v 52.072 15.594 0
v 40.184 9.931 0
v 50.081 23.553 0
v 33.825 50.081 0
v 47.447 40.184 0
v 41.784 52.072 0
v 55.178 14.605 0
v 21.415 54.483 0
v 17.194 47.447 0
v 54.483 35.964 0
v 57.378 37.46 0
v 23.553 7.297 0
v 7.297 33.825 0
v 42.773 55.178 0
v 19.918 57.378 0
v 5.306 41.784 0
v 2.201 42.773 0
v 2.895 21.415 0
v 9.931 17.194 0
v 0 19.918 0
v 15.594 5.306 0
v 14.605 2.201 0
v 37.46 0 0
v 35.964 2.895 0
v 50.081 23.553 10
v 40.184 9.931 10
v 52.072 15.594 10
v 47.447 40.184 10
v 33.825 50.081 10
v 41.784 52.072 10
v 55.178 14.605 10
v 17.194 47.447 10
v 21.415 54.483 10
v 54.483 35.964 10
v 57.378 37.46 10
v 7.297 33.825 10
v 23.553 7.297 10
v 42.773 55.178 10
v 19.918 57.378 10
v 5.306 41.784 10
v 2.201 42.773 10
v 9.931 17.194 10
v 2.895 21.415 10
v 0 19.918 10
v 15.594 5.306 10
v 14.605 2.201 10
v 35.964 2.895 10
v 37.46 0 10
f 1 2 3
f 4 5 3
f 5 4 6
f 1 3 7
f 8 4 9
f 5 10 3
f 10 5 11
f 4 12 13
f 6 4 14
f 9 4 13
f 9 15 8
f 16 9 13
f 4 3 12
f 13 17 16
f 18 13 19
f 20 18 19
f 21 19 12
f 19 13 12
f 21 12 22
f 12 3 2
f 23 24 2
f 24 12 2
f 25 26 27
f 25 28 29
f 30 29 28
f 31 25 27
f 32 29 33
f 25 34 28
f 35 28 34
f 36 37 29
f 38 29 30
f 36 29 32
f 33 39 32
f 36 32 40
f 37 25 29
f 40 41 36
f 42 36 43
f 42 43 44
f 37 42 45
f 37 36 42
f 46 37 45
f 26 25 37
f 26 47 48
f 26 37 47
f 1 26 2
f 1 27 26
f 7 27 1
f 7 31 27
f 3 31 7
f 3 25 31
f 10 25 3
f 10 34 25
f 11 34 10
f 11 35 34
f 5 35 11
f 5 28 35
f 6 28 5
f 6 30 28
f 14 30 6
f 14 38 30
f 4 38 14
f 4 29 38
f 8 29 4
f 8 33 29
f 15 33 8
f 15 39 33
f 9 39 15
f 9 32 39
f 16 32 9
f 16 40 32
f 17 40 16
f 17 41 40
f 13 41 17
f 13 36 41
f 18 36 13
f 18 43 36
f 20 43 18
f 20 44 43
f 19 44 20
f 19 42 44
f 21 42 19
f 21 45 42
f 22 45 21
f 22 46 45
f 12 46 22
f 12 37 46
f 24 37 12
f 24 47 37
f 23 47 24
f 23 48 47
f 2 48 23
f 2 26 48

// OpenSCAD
$fn = 32;

// ----------------------------------------------------------------------
// Fan rotor section: 8 blades, 22 mm hub radius, 8 mm blades
// ----------------------------------------------------------------------

// --- parameters (mm) ---
profile_height = 10;      // extrusion height
profile_points = 24;      // points of the closed outline

profile = [[50.081, 23.553], [54.483, 35.964], [57.378, 37.46], [47.447, 40.184], [41.784, 52.072], [42.773, 55.178], [33.825, 50.081], [21.415, 54.483], [19.918, 57.378], [17.194, 47.447], [5.306, 41.784], [2.201, 42.773], [7.297, 33.825], [2.895, 21.415], [0, 19.918], [9.931, 17.194], [15.594, 5.306], [14.605, 2.201], [23.553, 7.297], [35.964, 2.895], [37.46, 0], [40.184, 9.931], [52.072, 15.594], [55.178, 14.605]];  // single closed polygon, 24 points, counter clockwise

// --- the one profile operation ---
linear_extrude(height = profile_height) polygon(points = profile);
